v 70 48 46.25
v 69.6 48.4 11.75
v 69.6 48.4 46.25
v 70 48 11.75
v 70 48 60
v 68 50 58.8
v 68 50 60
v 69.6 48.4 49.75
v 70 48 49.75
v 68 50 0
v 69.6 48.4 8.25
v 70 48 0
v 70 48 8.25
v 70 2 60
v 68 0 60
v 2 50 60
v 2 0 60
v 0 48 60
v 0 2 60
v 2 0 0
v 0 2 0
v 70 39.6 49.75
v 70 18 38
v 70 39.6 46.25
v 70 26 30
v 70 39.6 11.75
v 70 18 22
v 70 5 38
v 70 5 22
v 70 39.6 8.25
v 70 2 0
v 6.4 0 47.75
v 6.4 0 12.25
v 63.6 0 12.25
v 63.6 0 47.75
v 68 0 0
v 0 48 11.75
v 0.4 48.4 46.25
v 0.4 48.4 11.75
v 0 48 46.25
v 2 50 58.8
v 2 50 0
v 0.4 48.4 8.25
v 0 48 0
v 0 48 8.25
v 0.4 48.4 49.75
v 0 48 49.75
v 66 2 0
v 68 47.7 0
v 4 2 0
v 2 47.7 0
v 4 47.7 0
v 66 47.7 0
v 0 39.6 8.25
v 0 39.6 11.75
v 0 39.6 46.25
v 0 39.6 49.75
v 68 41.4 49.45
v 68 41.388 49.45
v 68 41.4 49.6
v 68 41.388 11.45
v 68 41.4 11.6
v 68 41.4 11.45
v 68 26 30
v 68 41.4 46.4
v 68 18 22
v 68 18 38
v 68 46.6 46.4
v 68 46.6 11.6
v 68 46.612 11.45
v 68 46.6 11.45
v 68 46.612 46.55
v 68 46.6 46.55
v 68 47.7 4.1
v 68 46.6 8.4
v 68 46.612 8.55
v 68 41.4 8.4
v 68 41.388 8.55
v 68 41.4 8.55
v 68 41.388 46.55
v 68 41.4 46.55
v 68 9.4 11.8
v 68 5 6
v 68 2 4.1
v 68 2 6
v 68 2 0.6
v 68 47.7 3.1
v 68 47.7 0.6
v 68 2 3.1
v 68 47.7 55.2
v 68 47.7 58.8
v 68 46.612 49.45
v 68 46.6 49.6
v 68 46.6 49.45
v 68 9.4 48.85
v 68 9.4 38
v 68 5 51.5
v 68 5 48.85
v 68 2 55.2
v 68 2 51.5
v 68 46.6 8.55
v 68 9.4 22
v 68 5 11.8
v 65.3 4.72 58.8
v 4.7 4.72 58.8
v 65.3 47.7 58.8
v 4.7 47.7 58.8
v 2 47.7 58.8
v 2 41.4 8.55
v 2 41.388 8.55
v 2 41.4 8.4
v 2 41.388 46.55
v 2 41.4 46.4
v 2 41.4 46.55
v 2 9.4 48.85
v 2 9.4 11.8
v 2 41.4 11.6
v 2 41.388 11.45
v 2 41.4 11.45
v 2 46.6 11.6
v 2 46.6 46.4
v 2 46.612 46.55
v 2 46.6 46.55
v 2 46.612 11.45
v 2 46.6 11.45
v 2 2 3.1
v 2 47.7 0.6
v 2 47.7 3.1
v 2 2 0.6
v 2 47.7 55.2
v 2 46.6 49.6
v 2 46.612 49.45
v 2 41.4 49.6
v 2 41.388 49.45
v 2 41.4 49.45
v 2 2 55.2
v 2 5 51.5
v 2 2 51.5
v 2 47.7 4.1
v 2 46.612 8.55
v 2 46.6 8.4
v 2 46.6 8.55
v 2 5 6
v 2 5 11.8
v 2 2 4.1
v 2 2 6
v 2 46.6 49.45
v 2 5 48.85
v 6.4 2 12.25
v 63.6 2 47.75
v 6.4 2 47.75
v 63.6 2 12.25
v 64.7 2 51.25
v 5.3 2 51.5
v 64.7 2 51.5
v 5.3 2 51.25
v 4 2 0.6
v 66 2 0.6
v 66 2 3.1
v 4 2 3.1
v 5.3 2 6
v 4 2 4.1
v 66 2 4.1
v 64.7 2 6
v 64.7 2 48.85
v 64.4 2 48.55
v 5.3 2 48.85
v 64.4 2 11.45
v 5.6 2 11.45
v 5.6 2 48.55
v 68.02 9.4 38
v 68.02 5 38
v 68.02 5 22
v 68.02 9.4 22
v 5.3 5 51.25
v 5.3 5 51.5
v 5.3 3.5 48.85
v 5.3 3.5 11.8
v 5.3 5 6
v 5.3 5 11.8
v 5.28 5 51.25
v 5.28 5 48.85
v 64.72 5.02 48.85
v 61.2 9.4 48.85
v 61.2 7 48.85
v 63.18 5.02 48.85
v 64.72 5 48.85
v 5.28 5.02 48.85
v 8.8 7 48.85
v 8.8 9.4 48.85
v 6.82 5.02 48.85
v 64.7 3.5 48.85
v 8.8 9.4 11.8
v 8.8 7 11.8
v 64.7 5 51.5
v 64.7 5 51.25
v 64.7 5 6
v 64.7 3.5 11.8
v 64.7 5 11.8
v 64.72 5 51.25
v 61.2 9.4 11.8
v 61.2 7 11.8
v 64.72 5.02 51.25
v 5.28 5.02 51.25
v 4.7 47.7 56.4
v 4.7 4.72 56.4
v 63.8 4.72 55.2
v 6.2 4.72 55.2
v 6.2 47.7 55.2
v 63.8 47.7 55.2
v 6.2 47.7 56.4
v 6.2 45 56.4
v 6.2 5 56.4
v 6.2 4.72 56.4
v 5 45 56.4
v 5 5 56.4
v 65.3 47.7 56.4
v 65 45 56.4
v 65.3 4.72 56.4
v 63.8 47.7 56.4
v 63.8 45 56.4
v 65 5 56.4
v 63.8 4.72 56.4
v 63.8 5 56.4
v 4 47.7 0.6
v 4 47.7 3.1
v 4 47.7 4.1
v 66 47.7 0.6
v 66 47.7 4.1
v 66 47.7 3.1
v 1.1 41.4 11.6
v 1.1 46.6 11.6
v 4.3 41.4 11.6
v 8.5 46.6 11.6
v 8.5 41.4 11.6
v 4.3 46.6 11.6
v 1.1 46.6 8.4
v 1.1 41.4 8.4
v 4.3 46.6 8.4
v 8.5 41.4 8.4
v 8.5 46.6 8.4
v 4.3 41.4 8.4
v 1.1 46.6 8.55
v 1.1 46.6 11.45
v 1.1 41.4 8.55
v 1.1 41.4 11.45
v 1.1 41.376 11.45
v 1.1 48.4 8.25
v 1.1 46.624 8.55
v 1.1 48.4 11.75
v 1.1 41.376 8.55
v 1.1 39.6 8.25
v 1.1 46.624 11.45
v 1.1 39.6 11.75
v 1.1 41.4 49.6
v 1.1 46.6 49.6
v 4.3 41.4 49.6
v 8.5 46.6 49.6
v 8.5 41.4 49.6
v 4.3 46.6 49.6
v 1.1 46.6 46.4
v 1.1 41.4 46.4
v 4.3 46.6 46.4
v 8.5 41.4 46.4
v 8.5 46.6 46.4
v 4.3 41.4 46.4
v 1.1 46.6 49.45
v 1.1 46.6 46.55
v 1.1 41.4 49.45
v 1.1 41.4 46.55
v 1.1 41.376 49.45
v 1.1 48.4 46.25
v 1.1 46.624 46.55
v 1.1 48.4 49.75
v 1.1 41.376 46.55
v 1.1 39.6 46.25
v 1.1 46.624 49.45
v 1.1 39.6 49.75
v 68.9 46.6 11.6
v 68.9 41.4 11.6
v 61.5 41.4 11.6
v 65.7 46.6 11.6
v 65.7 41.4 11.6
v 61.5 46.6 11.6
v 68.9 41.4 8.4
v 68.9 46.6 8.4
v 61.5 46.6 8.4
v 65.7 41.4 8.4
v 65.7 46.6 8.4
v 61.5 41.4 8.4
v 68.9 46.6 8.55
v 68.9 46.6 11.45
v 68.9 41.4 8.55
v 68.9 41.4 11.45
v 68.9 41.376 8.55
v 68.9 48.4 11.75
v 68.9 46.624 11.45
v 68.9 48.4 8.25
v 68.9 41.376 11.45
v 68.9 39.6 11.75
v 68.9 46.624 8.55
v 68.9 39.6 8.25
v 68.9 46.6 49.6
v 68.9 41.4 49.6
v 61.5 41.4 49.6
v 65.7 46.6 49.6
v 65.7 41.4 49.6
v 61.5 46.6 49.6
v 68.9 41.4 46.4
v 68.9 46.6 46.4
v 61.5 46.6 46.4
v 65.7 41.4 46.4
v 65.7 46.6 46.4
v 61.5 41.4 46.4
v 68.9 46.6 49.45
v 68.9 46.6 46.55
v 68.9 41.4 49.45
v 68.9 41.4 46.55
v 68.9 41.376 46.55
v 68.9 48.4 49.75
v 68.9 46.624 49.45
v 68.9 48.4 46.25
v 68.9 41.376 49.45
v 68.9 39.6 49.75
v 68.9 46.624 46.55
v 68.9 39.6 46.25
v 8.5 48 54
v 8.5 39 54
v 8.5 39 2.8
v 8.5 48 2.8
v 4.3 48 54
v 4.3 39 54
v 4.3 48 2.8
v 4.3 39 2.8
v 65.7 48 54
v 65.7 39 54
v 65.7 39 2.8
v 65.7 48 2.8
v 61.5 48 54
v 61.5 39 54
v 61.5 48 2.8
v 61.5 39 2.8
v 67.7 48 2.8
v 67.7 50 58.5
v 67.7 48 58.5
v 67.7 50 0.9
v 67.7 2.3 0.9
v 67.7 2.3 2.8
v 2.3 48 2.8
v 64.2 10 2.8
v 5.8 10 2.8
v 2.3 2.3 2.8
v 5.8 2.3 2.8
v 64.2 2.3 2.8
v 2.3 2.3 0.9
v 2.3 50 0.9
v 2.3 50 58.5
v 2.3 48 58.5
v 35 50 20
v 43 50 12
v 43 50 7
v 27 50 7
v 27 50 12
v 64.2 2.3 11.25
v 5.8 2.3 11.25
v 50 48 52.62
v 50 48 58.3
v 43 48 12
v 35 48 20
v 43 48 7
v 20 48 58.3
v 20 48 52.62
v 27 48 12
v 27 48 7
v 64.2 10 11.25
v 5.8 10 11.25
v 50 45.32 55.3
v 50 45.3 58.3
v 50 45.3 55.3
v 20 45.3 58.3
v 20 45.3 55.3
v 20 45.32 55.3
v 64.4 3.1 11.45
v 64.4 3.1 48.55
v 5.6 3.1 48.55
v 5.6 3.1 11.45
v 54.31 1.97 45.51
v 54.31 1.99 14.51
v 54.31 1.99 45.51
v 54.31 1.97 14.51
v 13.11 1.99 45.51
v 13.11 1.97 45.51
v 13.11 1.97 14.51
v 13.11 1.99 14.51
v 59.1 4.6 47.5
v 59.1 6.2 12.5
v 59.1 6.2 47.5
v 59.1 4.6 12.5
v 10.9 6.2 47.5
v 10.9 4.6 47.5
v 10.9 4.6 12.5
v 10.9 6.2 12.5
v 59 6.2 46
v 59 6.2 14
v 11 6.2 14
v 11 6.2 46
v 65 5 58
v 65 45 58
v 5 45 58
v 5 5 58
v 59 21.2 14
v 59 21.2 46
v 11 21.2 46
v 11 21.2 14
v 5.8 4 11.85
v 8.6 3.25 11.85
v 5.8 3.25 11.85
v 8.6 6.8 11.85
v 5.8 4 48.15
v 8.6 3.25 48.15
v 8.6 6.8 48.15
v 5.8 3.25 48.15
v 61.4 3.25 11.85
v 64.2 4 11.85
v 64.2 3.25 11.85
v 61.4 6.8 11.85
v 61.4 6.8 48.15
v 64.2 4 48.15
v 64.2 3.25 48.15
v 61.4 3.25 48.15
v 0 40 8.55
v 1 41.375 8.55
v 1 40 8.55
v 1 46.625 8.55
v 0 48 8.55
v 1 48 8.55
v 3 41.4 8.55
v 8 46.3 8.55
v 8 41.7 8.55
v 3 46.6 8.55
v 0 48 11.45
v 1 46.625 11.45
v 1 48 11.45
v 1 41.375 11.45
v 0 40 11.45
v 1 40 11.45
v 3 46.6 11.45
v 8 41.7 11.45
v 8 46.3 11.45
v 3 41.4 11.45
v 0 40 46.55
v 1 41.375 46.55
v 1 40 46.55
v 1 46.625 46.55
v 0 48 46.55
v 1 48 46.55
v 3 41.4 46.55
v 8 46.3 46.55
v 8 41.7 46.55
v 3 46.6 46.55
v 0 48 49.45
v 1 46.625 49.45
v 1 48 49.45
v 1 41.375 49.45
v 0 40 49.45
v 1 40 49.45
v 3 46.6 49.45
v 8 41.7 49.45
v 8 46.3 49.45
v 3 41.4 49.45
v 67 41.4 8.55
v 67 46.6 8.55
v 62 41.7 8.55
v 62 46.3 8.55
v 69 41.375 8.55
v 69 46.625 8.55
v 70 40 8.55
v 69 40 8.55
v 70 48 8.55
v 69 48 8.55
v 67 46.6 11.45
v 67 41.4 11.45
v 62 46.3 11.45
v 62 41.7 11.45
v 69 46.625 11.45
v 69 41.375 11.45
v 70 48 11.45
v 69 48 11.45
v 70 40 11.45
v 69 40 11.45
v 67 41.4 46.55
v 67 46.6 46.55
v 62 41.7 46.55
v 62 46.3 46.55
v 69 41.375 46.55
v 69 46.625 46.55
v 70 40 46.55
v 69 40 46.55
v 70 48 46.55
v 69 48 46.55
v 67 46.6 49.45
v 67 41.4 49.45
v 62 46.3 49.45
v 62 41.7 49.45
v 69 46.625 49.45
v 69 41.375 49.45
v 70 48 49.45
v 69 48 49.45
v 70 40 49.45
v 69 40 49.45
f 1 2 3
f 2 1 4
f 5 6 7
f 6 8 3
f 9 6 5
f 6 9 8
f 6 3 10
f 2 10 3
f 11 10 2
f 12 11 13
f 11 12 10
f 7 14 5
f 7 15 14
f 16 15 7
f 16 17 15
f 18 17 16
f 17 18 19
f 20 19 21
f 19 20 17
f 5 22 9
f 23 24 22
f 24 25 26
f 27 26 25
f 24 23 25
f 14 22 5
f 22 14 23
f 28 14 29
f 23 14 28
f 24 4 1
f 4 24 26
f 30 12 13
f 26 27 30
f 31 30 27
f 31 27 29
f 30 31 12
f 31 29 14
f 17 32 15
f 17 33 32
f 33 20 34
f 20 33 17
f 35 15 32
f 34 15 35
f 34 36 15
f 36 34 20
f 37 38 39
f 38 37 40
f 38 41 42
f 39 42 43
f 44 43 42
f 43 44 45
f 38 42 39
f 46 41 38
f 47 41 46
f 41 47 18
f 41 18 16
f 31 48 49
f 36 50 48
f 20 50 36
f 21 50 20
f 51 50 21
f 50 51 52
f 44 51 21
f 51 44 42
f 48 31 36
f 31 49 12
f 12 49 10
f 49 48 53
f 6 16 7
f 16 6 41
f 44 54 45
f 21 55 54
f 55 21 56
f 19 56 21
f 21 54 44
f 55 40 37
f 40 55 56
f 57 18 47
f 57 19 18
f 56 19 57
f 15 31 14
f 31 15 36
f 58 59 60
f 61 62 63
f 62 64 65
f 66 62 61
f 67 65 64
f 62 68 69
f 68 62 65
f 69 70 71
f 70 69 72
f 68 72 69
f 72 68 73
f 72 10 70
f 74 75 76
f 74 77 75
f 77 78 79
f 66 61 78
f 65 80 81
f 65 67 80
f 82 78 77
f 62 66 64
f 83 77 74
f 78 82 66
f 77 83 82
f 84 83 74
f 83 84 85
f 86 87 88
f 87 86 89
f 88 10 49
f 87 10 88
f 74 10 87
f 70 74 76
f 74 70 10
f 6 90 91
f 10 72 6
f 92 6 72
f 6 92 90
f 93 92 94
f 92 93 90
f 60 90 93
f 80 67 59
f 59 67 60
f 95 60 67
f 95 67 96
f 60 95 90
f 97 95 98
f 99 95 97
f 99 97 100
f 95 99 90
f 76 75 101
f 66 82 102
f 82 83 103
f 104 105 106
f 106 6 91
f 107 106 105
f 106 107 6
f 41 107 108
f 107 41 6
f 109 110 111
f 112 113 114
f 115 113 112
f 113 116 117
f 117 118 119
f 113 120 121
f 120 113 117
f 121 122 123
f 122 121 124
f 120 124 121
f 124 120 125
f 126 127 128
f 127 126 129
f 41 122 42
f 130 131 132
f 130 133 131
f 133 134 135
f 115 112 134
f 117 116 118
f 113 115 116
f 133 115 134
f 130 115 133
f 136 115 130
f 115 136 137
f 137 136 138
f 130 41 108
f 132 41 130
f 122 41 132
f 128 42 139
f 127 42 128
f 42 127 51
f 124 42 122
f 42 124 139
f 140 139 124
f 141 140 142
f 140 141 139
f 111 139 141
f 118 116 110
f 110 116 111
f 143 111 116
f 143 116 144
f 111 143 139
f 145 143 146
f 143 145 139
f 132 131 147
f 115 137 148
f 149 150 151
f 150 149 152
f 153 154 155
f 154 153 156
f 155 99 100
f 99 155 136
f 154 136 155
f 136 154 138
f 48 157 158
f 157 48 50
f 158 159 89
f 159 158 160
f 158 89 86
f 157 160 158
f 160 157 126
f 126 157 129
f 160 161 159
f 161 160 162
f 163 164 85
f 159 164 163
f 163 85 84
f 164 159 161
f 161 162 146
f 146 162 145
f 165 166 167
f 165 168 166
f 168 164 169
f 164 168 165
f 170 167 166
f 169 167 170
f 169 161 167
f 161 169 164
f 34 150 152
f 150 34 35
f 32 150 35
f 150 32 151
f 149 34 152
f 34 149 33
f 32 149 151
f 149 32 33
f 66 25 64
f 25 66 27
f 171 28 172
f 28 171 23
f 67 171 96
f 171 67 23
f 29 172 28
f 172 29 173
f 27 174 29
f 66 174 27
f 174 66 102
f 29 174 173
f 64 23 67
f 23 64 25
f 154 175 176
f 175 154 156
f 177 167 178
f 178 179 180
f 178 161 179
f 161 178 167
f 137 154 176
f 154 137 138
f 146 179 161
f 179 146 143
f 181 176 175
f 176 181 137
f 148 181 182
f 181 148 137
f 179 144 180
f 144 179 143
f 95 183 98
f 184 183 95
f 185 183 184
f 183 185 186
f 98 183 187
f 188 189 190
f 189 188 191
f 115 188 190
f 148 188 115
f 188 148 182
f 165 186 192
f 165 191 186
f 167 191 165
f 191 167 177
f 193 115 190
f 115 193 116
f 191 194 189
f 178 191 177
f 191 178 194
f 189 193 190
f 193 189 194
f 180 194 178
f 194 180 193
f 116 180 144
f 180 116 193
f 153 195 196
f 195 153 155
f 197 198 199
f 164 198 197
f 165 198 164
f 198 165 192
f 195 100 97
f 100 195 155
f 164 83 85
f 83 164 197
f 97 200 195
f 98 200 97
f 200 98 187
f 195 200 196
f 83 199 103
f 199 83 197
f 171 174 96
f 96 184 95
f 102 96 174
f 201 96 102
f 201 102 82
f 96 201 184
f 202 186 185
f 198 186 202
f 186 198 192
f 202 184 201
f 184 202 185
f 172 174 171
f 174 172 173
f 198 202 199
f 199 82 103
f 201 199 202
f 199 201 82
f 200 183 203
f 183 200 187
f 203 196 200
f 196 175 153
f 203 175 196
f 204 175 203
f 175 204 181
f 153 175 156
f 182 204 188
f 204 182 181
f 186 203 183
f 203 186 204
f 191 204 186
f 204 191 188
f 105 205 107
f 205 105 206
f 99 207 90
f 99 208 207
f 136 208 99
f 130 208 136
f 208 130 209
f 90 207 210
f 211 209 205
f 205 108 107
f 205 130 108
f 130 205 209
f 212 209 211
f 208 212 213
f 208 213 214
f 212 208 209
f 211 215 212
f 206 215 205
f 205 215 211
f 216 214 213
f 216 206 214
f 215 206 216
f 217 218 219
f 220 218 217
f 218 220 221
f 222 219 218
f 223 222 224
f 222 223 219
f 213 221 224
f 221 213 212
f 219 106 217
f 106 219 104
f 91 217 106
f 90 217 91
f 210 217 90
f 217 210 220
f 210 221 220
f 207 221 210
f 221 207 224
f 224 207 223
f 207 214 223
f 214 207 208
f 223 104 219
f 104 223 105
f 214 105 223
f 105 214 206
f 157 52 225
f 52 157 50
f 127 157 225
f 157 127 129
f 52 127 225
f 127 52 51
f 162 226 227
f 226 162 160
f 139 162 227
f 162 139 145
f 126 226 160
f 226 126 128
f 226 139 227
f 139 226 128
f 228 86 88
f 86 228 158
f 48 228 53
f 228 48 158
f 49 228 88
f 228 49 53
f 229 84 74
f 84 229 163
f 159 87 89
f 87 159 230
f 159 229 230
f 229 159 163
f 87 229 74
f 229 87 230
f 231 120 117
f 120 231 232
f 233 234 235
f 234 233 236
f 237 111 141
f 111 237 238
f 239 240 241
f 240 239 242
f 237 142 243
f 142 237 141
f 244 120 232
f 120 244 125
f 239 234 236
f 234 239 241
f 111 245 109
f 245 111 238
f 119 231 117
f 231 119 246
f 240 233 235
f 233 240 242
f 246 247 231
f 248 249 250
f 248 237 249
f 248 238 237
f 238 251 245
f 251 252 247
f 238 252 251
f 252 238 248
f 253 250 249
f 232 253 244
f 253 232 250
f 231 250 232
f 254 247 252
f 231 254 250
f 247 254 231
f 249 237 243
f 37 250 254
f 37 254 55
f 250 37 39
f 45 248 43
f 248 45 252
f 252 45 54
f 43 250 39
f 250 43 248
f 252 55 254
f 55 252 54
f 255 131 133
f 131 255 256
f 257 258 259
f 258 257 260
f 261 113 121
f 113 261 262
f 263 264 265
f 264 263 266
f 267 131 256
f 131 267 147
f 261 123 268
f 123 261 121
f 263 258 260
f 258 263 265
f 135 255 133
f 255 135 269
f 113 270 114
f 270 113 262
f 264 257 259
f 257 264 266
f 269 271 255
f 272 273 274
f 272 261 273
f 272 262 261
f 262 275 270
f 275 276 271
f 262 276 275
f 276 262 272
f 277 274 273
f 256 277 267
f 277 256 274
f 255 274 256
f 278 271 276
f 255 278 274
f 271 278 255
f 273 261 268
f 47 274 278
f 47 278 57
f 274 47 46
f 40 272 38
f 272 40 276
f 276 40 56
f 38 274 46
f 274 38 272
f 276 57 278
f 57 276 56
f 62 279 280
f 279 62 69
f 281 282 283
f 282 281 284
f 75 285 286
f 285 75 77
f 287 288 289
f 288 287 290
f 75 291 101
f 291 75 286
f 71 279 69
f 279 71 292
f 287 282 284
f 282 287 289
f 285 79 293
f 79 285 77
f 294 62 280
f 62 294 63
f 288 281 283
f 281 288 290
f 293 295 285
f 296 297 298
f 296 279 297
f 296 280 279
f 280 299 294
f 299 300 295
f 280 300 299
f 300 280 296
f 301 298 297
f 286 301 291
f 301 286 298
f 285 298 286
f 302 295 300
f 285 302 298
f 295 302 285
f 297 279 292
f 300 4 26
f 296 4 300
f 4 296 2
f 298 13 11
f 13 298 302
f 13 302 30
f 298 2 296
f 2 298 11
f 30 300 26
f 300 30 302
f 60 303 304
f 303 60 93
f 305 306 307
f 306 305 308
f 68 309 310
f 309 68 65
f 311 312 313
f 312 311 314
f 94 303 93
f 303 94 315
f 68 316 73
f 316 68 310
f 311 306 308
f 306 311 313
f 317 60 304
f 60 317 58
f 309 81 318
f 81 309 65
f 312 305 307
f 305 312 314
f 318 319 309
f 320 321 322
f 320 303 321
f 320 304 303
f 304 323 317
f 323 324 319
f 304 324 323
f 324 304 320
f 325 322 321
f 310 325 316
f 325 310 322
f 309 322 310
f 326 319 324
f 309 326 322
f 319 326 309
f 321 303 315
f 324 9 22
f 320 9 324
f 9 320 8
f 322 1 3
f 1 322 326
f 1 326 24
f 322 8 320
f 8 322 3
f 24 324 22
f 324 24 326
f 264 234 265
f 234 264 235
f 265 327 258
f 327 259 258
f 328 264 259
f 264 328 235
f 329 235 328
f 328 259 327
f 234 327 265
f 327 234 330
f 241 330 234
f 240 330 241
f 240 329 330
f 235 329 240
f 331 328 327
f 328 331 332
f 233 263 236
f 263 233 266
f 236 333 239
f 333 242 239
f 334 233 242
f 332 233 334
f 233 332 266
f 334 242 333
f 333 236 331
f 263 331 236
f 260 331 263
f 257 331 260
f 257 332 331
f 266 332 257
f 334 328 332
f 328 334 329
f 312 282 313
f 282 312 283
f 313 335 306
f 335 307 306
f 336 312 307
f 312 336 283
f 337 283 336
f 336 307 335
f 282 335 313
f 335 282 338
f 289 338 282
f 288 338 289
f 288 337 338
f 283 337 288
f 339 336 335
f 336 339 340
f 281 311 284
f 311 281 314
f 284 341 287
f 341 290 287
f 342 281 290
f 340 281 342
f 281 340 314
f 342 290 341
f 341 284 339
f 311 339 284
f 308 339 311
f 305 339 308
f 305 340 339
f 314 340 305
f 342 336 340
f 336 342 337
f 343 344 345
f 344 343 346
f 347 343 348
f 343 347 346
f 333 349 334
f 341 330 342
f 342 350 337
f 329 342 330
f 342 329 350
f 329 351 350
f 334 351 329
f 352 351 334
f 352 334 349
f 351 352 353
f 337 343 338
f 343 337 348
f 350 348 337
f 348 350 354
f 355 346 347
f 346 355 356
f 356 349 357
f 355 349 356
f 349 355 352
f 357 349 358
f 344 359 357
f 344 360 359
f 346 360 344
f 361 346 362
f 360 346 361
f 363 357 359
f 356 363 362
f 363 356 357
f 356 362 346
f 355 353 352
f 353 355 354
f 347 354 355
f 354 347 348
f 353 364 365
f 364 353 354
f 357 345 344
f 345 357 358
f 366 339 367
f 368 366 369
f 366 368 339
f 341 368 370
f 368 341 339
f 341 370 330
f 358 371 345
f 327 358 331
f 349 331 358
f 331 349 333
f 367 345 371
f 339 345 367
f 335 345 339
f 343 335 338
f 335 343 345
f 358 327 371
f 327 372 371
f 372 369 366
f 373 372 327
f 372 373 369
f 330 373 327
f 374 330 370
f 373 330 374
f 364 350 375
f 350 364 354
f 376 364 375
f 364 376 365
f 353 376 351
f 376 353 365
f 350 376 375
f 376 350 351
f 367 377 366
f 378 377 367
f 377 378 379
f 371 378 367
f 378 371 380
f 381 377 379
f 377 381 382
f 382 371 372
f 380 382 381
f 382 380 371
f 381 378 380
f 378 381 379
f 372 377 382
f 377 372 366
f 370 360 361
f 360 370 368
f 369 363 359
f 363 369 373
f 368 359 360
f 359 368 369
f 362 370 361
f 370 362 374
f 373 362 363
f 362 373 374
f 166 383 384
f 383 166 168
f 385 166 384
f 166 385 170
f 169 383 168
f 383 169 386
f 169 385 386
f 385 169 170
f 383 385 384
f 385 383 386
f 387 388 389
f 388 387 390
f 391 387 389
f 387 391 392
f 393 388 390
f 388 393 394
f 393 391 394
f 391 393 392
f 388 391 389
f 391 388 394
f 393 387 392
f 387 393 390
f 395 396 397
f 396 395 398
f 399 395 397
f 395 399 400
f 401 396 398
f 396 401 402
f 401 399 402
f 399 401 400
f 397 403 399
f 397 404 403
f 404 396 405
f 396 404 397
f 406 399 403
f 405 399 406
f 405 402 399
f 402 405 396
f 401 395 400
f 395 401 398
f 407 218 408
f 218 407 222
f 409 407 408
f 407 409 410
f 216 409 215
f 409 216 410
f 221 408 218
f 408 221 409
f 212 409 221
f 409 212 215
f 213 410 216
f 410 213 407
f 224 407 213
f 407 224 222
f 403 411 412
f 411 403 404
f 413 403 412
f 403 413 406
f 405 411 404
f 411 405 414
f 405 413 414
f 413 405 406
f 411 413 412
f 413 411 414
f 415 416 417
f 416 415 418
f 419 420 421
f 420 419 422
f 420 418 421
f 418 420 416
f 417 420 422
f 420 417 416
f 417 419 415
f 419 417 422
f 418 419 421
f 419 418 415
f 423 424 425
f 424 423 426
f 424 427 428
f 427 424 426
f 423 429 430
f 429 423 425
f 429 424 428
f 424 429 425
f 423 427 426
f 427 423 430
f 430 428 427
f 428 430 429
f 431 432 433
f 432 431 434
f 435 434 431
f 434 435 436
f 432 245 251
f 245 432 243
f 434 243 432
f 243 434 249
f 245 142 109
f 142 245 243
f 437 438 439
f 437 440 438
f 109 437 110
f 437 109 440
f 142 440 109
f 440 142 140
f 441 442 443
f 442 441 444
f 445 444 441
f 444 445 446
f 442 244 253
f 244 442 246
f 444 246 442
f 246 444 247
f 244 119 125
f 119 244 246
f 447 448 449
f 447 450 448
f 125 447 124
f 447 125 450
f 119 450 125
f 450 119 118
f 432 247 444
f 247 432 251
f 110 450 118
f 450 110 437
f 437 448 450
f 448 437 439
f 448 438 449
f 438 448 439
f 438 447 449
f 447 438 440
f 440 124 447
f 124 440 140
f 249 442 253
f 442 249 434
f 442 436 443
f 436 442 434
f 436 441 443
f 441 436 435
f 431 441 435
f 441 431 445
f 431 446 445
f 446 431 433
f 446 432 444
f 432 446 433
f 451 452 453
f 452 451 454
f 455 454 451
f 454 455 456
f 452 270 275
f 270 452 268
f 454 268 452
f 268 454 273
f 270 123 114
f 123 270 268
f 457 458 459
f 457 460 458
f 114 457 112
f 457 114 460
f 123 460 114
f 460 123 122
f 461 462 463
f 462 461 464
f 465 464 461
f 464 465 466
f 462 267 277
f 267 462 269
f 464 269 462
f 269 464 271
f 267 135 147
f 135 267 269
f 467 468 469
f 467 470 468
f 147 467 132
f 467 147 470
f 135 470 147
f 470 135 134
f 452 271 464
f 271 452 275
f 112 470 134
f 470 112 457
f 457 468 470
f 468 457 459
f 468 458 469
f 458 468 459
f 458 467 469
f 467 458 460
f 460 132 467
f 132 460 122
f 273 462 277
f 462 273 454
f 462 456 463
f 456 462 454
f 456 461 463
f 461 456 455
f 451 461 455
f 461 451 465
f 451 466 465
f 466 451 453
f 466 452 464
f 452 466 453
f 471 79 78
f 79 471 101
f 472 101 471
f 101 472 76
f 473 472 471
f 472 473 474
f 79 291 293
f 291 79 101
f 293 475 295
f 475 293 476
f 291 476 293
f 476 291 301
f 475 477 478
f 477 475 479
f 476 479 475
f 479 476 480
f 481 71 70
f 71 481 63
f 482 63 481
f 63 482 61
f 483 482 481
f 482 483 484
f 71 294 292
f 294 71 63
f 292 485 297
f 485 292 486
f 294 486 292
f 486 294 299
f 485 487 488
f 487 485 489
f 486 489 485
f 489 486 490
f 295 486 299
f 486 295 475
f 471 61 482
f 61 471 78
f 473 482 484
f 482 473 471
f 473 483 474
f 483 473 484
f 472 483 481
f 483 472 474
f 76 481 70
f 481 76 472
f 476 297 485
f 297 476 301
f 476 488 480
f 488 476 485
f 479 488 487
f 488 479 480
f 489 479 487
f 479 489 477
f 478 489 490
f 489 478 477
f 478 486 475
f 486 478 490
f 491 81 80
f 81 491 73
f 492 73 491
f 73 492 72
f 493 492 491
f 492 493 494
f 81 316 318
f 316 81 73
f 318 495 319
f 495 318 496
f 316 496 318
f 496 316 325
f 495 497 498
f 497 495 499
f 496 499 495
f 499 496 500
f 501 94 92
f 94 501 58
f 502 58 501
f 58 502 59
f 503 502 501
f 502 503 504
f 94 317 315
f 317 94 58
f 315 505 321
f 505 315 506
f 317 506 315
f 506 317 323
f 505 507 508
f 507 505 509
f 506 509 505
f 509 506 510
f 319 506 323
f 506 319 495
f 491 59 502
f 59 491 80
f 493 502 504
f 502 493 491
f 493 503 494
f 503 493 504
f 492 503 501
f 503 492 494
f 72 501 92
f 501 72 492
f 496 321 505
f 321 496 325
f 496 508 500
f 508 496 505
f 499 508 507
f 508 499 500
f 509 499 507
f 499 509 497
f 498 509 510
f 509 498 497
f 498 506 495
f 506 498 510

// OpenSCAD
// NFC jukebox enclosure rC - front-face-down print orientation, millimetres.
// Source: Waveshare ESP32-S3-Touch-LCD-2 dimension drawing.
// RC522 nominal 60x40 PCB; actual thickness/component keepouts need fit check.
// Coordinates: X width, Y front->rear, Z height. Front is Y=0.
// Use: openscad -D 'part="body"' -o body.stl jukebox.scad
fit = 0.15; // clamp clearance: 0 tight, 0.15 normal, 0.30 loose
key_fit = 0; // -0.15 for loose keys
part = "assembly"; // body, drawer, assembly, exploded, interference
$fn = 40;
W=70; D=50; H=60;
wall=2;
glass_w=58.8; glass_h=37.1; glass_t=1.1;
glass_x=(W-glass_w)/2; glass_z=(H-glass_h)/2;
glass_y=wall;
glass_gap=0.4;
rail_rear=glass_y+glass_t+glass_gap;
rc_w=60; rc_d=40; rc_t=1.6;
rc_x=(W-rc_w)/2; rc_y=(D-rc_d)/2;
rc_z=56.4;
clearance=0.3;
eps=0.02;

module box(x,y,z,dx,dy,dz){translate([x,y,z])cube([dx,dy,dz]);}

module shell(){
  difference(){
    // Chamfers grow at 45 degrees when printing with the front on the bed.
    linear_extrude(height=H)polygon([[2,0],[W-2,0],[W,2],[W,D-2],
      [W-2,D],[2,D],[0,D-2],[0,2]]);
    // Open bottom and rear, roof 1.2 mm. Side/front walls 2 mm.
    box(wall,wall,-eps,W-2*wall,D,H-1.2+eps);
    // Front bezel overlaps glass by 0.8 mm each edge.
    box(glass_x+0.8,-eps,glass_z+0.8,glass_w-1.6,wall+2*eps,glass_h-1.6);
    // USB opening on the right only, viewed from the display front.
    translate([W-wall-eps,0,0])rotate([90,0,90])
      linear_extrude(height=wall+2*eps)
        polygon([[5,22],[18,22],[26,30],[18,38],[5,38]]);

  }
}

module display_guides(){
  for(right=[false,true])translate([right ? W : 0,0,0])scale([right ? -1 : 1,1,1]){
    box(wall-eps,wall-eps,6,5.3-wall+eps,3.02,45.5);
    translate([0,0,glass_z+0.35])linear_extrude(height=glass_h-0.05)
      polygon([[1.98,3.5],[5.3,3.5],[8.8,7],[8.8,9.4],[1.98,9.4]]);
  }
  box(glass_x-clearance-eps,wall-eps,glass_z+glass_h+clearance,
      glass_w+2*clearance+2*eps,3.04,2.4);
}

// Each strip bears on an outer glass margin, outside the PCB envelope.
module strip(){
  translate([0,0,glass_z+0.4])linear_extrude(height=glass_h-0.8)
    polygon([[5.8,3.1+fit],[8.6,3.1+fit],[8.6,6.8],[5.8,4.0]]);
}
module strips(){
  strip();translate([W,0,0])mirror([1,0,0])strip();
}
module strips_print(){
  // Glass contact face down; both handed strips supplied as a pair.
  translate([-5.8,glass_z+glass_h-0.4,-3.1-fit])rotate([90,0,0])strip();
  translate([14.4,glass_z+glass_h-0.4,-3.1-fit])rotate([90,0,0])mirror([1,0,0])strip();
}

module rfid_guides(){
  // Board slides in from the open rear, antenna side up, solder joints down.
  // 2.4-mm channel for nominal 1.6-mm PCB. No metal or supports under antenna.
  for(right=[false,true]){
    x=right ? rc_x+rc_w+clearance : wall-eps;
    width=right ? W-wall-x+eps : rc_x-clearance-wall+eps;
    box(x,rc_y-clearance,55.2,width,D-wall-clearance-(rc_y-clearance),H-1.2-55.2+eps);
    ledge_x=right ? rc_x+rc_w-1.2 : wall-eps;
    ledge_w=right ? W-wall-ledge_x+eps : rc_x+1.2-wall+eps;
    box(ledge_x,rc_y-clearance,55.2,ledge_w,D-wall-clearance-(rc_y-clearance),1.2);
  }
  // Root the front stop in the front wall, avoiding a floating first layer.
  box(wall-eps,wall-eps,55.2,W-2*wall+2*eps,rc_y-clearance-wall+2*eps,H-1.2-55.2+eps);
}

module floor_guides(){
  for(right=[false,true]){
    x=right ? W-wall-2 : wall-eps;
    box(x,wall-eps,0,2+eps,D-2*wall-clearance+eps,0.6);
    box(x,wall-eps,3.1,2+eps,D-2*wall-clearance+eps,1.0);
  }
}

// Four transverse solid keys lock both upper and lower back corners.
module key_holes(){
  for(right=[false,true])translate([right ? W : 0,0,0])scale([right ? -1 : 1,1,1])
    for(z=[10,48]){
      box(-eps,41.4,z-1.6,9.4,5.2,3.2);
      box(-eps,39.6,z-1.75,1.12,8.8,3.5);
    }
}
module body(){difference(){
  union(){shell();display_guides();rfid_guides();floor_guides();}
  key_holes();
}}
module key(){
  linear_extrude(height=2.9)polygon([[0,-4],[1,-4],[1,-2.625-key_fit/2],
    [3,-2.6-key_fit/2],[8,-2.3],[8,2.3],[3,2.6+key_fit/2],
    [1,2.625+key_fit/2],[1,4],[0,4]]);
}
module keys(){
  for(right=[false,true])translate([right ? W : 0,0,0])scale([right ? -1 : 1,1,1])
    for(z=[10,48])translate([0,44,z-1.45])key();
}
module keys_print(){for(i=[0:3])translate([i*11,4,0])key();}
module drawer(){difference(){
  union(){
    box(2.3,2.3,0.9,W-4.6,D-2.3,1.9);
    box(2.3,48,0.9,W-4.6,2,57.6);
    // Continuous ribs connect all four key seats to floor and back.
    for(x=[4.3,W-8.5])box(x,39,2.7,4.2,9.02,51.3);
    // Broad display plinth replaces fragile individual fingers.
    box(5.8,2.3,2.7,W-11.6,7.7,glass_z-0.2-2.7);
    // RFID rear stop and self-supporting gusset.
    box(20,rc_y+rc_d+clearance,55.3,30,48-(rc_y+rc_d+clearance)+eps,3);
    translate([20,48,52.6])rotate([90,0,90])linear_extrude(height=30)
      polygon([[eps,0],[eps,2.72],[-2.7,2.72]]);
  }
  key_holes();
  // Rear grip: triangular roof, no long bridge.
  translate([27,50.1,7])rotate([90,0,0])linear_extrude(height=2.2)
    polygon([[0,0],[16,0],[16,5],[8,13],[0,5]]);
}}

module hardware(){
  color([0.12,0.16,0.19])box(glass_x,glass_y,glass_z,glass_w,glass_t,glass_h);
  color([0.08,0.65,0.64])box(glass_x+7.51,glass_y-0.03,glass_z+3.06,41.2,0.02,31);
  // PCB envelope; actual connector positions are deliberately not asserted.
  color([0.1,0.3,0.6])box((W-48.2)/2,glass_y+glass_t+1.5,(H-35)/2,48.2,1.6,35);
  color([0.08,0.35,0.62])box(rc_x,rc_y,rc_z,rc_w,rc_d,rc_t);
  // Approximate rear electronics keepout, for illustration only.
  color([0.55,0.55,0.55,0.3])box(11,6.2,14,48,15,32);
}

if(part=="body") translate([0,H,0])rotate([90,0,0])body();
else if(part=="drawer")translate([0,0,-0.9])drawer();
else if(part=="strips")strips_print();
else if(part=="keys")keys_print();
else if(part=="interference")intersection(){body();drawer();}
else if(part=="plate") {
  translate([0,0,0])translate([0,H,0])rotate([90,0,0])body();
  translate([80,0,-0.9])drawer();
  translate([0,70,0])keys_print();
  translate([80,65,0])strips_print();
}
else if(part=="strip_check")intersection(){body();strips();}
else if(part=="travel_check")intersection(){body();union()for(dy=[0:1:50])translate([0,dy,0])drawer();}
else if(part=="exploded"){
  color([0.76,0.80,0.83,0.32])body();hardware();
  color([0.94,0.55,0.22])translate([0,33,-13])drawer();
  color([0.95,0.7,0.1])translate([0,0,-16])strips();
  color([0.1,0.65,0.7])keys();
} else {
  color([0.76,0.80,0.83,0.4])body();
  color([0.3,0.36,0.42])drawer();hardware();
  color([0.95,0.7,0.1])strips();color([0.1,0.65,0.7])keys();
}
